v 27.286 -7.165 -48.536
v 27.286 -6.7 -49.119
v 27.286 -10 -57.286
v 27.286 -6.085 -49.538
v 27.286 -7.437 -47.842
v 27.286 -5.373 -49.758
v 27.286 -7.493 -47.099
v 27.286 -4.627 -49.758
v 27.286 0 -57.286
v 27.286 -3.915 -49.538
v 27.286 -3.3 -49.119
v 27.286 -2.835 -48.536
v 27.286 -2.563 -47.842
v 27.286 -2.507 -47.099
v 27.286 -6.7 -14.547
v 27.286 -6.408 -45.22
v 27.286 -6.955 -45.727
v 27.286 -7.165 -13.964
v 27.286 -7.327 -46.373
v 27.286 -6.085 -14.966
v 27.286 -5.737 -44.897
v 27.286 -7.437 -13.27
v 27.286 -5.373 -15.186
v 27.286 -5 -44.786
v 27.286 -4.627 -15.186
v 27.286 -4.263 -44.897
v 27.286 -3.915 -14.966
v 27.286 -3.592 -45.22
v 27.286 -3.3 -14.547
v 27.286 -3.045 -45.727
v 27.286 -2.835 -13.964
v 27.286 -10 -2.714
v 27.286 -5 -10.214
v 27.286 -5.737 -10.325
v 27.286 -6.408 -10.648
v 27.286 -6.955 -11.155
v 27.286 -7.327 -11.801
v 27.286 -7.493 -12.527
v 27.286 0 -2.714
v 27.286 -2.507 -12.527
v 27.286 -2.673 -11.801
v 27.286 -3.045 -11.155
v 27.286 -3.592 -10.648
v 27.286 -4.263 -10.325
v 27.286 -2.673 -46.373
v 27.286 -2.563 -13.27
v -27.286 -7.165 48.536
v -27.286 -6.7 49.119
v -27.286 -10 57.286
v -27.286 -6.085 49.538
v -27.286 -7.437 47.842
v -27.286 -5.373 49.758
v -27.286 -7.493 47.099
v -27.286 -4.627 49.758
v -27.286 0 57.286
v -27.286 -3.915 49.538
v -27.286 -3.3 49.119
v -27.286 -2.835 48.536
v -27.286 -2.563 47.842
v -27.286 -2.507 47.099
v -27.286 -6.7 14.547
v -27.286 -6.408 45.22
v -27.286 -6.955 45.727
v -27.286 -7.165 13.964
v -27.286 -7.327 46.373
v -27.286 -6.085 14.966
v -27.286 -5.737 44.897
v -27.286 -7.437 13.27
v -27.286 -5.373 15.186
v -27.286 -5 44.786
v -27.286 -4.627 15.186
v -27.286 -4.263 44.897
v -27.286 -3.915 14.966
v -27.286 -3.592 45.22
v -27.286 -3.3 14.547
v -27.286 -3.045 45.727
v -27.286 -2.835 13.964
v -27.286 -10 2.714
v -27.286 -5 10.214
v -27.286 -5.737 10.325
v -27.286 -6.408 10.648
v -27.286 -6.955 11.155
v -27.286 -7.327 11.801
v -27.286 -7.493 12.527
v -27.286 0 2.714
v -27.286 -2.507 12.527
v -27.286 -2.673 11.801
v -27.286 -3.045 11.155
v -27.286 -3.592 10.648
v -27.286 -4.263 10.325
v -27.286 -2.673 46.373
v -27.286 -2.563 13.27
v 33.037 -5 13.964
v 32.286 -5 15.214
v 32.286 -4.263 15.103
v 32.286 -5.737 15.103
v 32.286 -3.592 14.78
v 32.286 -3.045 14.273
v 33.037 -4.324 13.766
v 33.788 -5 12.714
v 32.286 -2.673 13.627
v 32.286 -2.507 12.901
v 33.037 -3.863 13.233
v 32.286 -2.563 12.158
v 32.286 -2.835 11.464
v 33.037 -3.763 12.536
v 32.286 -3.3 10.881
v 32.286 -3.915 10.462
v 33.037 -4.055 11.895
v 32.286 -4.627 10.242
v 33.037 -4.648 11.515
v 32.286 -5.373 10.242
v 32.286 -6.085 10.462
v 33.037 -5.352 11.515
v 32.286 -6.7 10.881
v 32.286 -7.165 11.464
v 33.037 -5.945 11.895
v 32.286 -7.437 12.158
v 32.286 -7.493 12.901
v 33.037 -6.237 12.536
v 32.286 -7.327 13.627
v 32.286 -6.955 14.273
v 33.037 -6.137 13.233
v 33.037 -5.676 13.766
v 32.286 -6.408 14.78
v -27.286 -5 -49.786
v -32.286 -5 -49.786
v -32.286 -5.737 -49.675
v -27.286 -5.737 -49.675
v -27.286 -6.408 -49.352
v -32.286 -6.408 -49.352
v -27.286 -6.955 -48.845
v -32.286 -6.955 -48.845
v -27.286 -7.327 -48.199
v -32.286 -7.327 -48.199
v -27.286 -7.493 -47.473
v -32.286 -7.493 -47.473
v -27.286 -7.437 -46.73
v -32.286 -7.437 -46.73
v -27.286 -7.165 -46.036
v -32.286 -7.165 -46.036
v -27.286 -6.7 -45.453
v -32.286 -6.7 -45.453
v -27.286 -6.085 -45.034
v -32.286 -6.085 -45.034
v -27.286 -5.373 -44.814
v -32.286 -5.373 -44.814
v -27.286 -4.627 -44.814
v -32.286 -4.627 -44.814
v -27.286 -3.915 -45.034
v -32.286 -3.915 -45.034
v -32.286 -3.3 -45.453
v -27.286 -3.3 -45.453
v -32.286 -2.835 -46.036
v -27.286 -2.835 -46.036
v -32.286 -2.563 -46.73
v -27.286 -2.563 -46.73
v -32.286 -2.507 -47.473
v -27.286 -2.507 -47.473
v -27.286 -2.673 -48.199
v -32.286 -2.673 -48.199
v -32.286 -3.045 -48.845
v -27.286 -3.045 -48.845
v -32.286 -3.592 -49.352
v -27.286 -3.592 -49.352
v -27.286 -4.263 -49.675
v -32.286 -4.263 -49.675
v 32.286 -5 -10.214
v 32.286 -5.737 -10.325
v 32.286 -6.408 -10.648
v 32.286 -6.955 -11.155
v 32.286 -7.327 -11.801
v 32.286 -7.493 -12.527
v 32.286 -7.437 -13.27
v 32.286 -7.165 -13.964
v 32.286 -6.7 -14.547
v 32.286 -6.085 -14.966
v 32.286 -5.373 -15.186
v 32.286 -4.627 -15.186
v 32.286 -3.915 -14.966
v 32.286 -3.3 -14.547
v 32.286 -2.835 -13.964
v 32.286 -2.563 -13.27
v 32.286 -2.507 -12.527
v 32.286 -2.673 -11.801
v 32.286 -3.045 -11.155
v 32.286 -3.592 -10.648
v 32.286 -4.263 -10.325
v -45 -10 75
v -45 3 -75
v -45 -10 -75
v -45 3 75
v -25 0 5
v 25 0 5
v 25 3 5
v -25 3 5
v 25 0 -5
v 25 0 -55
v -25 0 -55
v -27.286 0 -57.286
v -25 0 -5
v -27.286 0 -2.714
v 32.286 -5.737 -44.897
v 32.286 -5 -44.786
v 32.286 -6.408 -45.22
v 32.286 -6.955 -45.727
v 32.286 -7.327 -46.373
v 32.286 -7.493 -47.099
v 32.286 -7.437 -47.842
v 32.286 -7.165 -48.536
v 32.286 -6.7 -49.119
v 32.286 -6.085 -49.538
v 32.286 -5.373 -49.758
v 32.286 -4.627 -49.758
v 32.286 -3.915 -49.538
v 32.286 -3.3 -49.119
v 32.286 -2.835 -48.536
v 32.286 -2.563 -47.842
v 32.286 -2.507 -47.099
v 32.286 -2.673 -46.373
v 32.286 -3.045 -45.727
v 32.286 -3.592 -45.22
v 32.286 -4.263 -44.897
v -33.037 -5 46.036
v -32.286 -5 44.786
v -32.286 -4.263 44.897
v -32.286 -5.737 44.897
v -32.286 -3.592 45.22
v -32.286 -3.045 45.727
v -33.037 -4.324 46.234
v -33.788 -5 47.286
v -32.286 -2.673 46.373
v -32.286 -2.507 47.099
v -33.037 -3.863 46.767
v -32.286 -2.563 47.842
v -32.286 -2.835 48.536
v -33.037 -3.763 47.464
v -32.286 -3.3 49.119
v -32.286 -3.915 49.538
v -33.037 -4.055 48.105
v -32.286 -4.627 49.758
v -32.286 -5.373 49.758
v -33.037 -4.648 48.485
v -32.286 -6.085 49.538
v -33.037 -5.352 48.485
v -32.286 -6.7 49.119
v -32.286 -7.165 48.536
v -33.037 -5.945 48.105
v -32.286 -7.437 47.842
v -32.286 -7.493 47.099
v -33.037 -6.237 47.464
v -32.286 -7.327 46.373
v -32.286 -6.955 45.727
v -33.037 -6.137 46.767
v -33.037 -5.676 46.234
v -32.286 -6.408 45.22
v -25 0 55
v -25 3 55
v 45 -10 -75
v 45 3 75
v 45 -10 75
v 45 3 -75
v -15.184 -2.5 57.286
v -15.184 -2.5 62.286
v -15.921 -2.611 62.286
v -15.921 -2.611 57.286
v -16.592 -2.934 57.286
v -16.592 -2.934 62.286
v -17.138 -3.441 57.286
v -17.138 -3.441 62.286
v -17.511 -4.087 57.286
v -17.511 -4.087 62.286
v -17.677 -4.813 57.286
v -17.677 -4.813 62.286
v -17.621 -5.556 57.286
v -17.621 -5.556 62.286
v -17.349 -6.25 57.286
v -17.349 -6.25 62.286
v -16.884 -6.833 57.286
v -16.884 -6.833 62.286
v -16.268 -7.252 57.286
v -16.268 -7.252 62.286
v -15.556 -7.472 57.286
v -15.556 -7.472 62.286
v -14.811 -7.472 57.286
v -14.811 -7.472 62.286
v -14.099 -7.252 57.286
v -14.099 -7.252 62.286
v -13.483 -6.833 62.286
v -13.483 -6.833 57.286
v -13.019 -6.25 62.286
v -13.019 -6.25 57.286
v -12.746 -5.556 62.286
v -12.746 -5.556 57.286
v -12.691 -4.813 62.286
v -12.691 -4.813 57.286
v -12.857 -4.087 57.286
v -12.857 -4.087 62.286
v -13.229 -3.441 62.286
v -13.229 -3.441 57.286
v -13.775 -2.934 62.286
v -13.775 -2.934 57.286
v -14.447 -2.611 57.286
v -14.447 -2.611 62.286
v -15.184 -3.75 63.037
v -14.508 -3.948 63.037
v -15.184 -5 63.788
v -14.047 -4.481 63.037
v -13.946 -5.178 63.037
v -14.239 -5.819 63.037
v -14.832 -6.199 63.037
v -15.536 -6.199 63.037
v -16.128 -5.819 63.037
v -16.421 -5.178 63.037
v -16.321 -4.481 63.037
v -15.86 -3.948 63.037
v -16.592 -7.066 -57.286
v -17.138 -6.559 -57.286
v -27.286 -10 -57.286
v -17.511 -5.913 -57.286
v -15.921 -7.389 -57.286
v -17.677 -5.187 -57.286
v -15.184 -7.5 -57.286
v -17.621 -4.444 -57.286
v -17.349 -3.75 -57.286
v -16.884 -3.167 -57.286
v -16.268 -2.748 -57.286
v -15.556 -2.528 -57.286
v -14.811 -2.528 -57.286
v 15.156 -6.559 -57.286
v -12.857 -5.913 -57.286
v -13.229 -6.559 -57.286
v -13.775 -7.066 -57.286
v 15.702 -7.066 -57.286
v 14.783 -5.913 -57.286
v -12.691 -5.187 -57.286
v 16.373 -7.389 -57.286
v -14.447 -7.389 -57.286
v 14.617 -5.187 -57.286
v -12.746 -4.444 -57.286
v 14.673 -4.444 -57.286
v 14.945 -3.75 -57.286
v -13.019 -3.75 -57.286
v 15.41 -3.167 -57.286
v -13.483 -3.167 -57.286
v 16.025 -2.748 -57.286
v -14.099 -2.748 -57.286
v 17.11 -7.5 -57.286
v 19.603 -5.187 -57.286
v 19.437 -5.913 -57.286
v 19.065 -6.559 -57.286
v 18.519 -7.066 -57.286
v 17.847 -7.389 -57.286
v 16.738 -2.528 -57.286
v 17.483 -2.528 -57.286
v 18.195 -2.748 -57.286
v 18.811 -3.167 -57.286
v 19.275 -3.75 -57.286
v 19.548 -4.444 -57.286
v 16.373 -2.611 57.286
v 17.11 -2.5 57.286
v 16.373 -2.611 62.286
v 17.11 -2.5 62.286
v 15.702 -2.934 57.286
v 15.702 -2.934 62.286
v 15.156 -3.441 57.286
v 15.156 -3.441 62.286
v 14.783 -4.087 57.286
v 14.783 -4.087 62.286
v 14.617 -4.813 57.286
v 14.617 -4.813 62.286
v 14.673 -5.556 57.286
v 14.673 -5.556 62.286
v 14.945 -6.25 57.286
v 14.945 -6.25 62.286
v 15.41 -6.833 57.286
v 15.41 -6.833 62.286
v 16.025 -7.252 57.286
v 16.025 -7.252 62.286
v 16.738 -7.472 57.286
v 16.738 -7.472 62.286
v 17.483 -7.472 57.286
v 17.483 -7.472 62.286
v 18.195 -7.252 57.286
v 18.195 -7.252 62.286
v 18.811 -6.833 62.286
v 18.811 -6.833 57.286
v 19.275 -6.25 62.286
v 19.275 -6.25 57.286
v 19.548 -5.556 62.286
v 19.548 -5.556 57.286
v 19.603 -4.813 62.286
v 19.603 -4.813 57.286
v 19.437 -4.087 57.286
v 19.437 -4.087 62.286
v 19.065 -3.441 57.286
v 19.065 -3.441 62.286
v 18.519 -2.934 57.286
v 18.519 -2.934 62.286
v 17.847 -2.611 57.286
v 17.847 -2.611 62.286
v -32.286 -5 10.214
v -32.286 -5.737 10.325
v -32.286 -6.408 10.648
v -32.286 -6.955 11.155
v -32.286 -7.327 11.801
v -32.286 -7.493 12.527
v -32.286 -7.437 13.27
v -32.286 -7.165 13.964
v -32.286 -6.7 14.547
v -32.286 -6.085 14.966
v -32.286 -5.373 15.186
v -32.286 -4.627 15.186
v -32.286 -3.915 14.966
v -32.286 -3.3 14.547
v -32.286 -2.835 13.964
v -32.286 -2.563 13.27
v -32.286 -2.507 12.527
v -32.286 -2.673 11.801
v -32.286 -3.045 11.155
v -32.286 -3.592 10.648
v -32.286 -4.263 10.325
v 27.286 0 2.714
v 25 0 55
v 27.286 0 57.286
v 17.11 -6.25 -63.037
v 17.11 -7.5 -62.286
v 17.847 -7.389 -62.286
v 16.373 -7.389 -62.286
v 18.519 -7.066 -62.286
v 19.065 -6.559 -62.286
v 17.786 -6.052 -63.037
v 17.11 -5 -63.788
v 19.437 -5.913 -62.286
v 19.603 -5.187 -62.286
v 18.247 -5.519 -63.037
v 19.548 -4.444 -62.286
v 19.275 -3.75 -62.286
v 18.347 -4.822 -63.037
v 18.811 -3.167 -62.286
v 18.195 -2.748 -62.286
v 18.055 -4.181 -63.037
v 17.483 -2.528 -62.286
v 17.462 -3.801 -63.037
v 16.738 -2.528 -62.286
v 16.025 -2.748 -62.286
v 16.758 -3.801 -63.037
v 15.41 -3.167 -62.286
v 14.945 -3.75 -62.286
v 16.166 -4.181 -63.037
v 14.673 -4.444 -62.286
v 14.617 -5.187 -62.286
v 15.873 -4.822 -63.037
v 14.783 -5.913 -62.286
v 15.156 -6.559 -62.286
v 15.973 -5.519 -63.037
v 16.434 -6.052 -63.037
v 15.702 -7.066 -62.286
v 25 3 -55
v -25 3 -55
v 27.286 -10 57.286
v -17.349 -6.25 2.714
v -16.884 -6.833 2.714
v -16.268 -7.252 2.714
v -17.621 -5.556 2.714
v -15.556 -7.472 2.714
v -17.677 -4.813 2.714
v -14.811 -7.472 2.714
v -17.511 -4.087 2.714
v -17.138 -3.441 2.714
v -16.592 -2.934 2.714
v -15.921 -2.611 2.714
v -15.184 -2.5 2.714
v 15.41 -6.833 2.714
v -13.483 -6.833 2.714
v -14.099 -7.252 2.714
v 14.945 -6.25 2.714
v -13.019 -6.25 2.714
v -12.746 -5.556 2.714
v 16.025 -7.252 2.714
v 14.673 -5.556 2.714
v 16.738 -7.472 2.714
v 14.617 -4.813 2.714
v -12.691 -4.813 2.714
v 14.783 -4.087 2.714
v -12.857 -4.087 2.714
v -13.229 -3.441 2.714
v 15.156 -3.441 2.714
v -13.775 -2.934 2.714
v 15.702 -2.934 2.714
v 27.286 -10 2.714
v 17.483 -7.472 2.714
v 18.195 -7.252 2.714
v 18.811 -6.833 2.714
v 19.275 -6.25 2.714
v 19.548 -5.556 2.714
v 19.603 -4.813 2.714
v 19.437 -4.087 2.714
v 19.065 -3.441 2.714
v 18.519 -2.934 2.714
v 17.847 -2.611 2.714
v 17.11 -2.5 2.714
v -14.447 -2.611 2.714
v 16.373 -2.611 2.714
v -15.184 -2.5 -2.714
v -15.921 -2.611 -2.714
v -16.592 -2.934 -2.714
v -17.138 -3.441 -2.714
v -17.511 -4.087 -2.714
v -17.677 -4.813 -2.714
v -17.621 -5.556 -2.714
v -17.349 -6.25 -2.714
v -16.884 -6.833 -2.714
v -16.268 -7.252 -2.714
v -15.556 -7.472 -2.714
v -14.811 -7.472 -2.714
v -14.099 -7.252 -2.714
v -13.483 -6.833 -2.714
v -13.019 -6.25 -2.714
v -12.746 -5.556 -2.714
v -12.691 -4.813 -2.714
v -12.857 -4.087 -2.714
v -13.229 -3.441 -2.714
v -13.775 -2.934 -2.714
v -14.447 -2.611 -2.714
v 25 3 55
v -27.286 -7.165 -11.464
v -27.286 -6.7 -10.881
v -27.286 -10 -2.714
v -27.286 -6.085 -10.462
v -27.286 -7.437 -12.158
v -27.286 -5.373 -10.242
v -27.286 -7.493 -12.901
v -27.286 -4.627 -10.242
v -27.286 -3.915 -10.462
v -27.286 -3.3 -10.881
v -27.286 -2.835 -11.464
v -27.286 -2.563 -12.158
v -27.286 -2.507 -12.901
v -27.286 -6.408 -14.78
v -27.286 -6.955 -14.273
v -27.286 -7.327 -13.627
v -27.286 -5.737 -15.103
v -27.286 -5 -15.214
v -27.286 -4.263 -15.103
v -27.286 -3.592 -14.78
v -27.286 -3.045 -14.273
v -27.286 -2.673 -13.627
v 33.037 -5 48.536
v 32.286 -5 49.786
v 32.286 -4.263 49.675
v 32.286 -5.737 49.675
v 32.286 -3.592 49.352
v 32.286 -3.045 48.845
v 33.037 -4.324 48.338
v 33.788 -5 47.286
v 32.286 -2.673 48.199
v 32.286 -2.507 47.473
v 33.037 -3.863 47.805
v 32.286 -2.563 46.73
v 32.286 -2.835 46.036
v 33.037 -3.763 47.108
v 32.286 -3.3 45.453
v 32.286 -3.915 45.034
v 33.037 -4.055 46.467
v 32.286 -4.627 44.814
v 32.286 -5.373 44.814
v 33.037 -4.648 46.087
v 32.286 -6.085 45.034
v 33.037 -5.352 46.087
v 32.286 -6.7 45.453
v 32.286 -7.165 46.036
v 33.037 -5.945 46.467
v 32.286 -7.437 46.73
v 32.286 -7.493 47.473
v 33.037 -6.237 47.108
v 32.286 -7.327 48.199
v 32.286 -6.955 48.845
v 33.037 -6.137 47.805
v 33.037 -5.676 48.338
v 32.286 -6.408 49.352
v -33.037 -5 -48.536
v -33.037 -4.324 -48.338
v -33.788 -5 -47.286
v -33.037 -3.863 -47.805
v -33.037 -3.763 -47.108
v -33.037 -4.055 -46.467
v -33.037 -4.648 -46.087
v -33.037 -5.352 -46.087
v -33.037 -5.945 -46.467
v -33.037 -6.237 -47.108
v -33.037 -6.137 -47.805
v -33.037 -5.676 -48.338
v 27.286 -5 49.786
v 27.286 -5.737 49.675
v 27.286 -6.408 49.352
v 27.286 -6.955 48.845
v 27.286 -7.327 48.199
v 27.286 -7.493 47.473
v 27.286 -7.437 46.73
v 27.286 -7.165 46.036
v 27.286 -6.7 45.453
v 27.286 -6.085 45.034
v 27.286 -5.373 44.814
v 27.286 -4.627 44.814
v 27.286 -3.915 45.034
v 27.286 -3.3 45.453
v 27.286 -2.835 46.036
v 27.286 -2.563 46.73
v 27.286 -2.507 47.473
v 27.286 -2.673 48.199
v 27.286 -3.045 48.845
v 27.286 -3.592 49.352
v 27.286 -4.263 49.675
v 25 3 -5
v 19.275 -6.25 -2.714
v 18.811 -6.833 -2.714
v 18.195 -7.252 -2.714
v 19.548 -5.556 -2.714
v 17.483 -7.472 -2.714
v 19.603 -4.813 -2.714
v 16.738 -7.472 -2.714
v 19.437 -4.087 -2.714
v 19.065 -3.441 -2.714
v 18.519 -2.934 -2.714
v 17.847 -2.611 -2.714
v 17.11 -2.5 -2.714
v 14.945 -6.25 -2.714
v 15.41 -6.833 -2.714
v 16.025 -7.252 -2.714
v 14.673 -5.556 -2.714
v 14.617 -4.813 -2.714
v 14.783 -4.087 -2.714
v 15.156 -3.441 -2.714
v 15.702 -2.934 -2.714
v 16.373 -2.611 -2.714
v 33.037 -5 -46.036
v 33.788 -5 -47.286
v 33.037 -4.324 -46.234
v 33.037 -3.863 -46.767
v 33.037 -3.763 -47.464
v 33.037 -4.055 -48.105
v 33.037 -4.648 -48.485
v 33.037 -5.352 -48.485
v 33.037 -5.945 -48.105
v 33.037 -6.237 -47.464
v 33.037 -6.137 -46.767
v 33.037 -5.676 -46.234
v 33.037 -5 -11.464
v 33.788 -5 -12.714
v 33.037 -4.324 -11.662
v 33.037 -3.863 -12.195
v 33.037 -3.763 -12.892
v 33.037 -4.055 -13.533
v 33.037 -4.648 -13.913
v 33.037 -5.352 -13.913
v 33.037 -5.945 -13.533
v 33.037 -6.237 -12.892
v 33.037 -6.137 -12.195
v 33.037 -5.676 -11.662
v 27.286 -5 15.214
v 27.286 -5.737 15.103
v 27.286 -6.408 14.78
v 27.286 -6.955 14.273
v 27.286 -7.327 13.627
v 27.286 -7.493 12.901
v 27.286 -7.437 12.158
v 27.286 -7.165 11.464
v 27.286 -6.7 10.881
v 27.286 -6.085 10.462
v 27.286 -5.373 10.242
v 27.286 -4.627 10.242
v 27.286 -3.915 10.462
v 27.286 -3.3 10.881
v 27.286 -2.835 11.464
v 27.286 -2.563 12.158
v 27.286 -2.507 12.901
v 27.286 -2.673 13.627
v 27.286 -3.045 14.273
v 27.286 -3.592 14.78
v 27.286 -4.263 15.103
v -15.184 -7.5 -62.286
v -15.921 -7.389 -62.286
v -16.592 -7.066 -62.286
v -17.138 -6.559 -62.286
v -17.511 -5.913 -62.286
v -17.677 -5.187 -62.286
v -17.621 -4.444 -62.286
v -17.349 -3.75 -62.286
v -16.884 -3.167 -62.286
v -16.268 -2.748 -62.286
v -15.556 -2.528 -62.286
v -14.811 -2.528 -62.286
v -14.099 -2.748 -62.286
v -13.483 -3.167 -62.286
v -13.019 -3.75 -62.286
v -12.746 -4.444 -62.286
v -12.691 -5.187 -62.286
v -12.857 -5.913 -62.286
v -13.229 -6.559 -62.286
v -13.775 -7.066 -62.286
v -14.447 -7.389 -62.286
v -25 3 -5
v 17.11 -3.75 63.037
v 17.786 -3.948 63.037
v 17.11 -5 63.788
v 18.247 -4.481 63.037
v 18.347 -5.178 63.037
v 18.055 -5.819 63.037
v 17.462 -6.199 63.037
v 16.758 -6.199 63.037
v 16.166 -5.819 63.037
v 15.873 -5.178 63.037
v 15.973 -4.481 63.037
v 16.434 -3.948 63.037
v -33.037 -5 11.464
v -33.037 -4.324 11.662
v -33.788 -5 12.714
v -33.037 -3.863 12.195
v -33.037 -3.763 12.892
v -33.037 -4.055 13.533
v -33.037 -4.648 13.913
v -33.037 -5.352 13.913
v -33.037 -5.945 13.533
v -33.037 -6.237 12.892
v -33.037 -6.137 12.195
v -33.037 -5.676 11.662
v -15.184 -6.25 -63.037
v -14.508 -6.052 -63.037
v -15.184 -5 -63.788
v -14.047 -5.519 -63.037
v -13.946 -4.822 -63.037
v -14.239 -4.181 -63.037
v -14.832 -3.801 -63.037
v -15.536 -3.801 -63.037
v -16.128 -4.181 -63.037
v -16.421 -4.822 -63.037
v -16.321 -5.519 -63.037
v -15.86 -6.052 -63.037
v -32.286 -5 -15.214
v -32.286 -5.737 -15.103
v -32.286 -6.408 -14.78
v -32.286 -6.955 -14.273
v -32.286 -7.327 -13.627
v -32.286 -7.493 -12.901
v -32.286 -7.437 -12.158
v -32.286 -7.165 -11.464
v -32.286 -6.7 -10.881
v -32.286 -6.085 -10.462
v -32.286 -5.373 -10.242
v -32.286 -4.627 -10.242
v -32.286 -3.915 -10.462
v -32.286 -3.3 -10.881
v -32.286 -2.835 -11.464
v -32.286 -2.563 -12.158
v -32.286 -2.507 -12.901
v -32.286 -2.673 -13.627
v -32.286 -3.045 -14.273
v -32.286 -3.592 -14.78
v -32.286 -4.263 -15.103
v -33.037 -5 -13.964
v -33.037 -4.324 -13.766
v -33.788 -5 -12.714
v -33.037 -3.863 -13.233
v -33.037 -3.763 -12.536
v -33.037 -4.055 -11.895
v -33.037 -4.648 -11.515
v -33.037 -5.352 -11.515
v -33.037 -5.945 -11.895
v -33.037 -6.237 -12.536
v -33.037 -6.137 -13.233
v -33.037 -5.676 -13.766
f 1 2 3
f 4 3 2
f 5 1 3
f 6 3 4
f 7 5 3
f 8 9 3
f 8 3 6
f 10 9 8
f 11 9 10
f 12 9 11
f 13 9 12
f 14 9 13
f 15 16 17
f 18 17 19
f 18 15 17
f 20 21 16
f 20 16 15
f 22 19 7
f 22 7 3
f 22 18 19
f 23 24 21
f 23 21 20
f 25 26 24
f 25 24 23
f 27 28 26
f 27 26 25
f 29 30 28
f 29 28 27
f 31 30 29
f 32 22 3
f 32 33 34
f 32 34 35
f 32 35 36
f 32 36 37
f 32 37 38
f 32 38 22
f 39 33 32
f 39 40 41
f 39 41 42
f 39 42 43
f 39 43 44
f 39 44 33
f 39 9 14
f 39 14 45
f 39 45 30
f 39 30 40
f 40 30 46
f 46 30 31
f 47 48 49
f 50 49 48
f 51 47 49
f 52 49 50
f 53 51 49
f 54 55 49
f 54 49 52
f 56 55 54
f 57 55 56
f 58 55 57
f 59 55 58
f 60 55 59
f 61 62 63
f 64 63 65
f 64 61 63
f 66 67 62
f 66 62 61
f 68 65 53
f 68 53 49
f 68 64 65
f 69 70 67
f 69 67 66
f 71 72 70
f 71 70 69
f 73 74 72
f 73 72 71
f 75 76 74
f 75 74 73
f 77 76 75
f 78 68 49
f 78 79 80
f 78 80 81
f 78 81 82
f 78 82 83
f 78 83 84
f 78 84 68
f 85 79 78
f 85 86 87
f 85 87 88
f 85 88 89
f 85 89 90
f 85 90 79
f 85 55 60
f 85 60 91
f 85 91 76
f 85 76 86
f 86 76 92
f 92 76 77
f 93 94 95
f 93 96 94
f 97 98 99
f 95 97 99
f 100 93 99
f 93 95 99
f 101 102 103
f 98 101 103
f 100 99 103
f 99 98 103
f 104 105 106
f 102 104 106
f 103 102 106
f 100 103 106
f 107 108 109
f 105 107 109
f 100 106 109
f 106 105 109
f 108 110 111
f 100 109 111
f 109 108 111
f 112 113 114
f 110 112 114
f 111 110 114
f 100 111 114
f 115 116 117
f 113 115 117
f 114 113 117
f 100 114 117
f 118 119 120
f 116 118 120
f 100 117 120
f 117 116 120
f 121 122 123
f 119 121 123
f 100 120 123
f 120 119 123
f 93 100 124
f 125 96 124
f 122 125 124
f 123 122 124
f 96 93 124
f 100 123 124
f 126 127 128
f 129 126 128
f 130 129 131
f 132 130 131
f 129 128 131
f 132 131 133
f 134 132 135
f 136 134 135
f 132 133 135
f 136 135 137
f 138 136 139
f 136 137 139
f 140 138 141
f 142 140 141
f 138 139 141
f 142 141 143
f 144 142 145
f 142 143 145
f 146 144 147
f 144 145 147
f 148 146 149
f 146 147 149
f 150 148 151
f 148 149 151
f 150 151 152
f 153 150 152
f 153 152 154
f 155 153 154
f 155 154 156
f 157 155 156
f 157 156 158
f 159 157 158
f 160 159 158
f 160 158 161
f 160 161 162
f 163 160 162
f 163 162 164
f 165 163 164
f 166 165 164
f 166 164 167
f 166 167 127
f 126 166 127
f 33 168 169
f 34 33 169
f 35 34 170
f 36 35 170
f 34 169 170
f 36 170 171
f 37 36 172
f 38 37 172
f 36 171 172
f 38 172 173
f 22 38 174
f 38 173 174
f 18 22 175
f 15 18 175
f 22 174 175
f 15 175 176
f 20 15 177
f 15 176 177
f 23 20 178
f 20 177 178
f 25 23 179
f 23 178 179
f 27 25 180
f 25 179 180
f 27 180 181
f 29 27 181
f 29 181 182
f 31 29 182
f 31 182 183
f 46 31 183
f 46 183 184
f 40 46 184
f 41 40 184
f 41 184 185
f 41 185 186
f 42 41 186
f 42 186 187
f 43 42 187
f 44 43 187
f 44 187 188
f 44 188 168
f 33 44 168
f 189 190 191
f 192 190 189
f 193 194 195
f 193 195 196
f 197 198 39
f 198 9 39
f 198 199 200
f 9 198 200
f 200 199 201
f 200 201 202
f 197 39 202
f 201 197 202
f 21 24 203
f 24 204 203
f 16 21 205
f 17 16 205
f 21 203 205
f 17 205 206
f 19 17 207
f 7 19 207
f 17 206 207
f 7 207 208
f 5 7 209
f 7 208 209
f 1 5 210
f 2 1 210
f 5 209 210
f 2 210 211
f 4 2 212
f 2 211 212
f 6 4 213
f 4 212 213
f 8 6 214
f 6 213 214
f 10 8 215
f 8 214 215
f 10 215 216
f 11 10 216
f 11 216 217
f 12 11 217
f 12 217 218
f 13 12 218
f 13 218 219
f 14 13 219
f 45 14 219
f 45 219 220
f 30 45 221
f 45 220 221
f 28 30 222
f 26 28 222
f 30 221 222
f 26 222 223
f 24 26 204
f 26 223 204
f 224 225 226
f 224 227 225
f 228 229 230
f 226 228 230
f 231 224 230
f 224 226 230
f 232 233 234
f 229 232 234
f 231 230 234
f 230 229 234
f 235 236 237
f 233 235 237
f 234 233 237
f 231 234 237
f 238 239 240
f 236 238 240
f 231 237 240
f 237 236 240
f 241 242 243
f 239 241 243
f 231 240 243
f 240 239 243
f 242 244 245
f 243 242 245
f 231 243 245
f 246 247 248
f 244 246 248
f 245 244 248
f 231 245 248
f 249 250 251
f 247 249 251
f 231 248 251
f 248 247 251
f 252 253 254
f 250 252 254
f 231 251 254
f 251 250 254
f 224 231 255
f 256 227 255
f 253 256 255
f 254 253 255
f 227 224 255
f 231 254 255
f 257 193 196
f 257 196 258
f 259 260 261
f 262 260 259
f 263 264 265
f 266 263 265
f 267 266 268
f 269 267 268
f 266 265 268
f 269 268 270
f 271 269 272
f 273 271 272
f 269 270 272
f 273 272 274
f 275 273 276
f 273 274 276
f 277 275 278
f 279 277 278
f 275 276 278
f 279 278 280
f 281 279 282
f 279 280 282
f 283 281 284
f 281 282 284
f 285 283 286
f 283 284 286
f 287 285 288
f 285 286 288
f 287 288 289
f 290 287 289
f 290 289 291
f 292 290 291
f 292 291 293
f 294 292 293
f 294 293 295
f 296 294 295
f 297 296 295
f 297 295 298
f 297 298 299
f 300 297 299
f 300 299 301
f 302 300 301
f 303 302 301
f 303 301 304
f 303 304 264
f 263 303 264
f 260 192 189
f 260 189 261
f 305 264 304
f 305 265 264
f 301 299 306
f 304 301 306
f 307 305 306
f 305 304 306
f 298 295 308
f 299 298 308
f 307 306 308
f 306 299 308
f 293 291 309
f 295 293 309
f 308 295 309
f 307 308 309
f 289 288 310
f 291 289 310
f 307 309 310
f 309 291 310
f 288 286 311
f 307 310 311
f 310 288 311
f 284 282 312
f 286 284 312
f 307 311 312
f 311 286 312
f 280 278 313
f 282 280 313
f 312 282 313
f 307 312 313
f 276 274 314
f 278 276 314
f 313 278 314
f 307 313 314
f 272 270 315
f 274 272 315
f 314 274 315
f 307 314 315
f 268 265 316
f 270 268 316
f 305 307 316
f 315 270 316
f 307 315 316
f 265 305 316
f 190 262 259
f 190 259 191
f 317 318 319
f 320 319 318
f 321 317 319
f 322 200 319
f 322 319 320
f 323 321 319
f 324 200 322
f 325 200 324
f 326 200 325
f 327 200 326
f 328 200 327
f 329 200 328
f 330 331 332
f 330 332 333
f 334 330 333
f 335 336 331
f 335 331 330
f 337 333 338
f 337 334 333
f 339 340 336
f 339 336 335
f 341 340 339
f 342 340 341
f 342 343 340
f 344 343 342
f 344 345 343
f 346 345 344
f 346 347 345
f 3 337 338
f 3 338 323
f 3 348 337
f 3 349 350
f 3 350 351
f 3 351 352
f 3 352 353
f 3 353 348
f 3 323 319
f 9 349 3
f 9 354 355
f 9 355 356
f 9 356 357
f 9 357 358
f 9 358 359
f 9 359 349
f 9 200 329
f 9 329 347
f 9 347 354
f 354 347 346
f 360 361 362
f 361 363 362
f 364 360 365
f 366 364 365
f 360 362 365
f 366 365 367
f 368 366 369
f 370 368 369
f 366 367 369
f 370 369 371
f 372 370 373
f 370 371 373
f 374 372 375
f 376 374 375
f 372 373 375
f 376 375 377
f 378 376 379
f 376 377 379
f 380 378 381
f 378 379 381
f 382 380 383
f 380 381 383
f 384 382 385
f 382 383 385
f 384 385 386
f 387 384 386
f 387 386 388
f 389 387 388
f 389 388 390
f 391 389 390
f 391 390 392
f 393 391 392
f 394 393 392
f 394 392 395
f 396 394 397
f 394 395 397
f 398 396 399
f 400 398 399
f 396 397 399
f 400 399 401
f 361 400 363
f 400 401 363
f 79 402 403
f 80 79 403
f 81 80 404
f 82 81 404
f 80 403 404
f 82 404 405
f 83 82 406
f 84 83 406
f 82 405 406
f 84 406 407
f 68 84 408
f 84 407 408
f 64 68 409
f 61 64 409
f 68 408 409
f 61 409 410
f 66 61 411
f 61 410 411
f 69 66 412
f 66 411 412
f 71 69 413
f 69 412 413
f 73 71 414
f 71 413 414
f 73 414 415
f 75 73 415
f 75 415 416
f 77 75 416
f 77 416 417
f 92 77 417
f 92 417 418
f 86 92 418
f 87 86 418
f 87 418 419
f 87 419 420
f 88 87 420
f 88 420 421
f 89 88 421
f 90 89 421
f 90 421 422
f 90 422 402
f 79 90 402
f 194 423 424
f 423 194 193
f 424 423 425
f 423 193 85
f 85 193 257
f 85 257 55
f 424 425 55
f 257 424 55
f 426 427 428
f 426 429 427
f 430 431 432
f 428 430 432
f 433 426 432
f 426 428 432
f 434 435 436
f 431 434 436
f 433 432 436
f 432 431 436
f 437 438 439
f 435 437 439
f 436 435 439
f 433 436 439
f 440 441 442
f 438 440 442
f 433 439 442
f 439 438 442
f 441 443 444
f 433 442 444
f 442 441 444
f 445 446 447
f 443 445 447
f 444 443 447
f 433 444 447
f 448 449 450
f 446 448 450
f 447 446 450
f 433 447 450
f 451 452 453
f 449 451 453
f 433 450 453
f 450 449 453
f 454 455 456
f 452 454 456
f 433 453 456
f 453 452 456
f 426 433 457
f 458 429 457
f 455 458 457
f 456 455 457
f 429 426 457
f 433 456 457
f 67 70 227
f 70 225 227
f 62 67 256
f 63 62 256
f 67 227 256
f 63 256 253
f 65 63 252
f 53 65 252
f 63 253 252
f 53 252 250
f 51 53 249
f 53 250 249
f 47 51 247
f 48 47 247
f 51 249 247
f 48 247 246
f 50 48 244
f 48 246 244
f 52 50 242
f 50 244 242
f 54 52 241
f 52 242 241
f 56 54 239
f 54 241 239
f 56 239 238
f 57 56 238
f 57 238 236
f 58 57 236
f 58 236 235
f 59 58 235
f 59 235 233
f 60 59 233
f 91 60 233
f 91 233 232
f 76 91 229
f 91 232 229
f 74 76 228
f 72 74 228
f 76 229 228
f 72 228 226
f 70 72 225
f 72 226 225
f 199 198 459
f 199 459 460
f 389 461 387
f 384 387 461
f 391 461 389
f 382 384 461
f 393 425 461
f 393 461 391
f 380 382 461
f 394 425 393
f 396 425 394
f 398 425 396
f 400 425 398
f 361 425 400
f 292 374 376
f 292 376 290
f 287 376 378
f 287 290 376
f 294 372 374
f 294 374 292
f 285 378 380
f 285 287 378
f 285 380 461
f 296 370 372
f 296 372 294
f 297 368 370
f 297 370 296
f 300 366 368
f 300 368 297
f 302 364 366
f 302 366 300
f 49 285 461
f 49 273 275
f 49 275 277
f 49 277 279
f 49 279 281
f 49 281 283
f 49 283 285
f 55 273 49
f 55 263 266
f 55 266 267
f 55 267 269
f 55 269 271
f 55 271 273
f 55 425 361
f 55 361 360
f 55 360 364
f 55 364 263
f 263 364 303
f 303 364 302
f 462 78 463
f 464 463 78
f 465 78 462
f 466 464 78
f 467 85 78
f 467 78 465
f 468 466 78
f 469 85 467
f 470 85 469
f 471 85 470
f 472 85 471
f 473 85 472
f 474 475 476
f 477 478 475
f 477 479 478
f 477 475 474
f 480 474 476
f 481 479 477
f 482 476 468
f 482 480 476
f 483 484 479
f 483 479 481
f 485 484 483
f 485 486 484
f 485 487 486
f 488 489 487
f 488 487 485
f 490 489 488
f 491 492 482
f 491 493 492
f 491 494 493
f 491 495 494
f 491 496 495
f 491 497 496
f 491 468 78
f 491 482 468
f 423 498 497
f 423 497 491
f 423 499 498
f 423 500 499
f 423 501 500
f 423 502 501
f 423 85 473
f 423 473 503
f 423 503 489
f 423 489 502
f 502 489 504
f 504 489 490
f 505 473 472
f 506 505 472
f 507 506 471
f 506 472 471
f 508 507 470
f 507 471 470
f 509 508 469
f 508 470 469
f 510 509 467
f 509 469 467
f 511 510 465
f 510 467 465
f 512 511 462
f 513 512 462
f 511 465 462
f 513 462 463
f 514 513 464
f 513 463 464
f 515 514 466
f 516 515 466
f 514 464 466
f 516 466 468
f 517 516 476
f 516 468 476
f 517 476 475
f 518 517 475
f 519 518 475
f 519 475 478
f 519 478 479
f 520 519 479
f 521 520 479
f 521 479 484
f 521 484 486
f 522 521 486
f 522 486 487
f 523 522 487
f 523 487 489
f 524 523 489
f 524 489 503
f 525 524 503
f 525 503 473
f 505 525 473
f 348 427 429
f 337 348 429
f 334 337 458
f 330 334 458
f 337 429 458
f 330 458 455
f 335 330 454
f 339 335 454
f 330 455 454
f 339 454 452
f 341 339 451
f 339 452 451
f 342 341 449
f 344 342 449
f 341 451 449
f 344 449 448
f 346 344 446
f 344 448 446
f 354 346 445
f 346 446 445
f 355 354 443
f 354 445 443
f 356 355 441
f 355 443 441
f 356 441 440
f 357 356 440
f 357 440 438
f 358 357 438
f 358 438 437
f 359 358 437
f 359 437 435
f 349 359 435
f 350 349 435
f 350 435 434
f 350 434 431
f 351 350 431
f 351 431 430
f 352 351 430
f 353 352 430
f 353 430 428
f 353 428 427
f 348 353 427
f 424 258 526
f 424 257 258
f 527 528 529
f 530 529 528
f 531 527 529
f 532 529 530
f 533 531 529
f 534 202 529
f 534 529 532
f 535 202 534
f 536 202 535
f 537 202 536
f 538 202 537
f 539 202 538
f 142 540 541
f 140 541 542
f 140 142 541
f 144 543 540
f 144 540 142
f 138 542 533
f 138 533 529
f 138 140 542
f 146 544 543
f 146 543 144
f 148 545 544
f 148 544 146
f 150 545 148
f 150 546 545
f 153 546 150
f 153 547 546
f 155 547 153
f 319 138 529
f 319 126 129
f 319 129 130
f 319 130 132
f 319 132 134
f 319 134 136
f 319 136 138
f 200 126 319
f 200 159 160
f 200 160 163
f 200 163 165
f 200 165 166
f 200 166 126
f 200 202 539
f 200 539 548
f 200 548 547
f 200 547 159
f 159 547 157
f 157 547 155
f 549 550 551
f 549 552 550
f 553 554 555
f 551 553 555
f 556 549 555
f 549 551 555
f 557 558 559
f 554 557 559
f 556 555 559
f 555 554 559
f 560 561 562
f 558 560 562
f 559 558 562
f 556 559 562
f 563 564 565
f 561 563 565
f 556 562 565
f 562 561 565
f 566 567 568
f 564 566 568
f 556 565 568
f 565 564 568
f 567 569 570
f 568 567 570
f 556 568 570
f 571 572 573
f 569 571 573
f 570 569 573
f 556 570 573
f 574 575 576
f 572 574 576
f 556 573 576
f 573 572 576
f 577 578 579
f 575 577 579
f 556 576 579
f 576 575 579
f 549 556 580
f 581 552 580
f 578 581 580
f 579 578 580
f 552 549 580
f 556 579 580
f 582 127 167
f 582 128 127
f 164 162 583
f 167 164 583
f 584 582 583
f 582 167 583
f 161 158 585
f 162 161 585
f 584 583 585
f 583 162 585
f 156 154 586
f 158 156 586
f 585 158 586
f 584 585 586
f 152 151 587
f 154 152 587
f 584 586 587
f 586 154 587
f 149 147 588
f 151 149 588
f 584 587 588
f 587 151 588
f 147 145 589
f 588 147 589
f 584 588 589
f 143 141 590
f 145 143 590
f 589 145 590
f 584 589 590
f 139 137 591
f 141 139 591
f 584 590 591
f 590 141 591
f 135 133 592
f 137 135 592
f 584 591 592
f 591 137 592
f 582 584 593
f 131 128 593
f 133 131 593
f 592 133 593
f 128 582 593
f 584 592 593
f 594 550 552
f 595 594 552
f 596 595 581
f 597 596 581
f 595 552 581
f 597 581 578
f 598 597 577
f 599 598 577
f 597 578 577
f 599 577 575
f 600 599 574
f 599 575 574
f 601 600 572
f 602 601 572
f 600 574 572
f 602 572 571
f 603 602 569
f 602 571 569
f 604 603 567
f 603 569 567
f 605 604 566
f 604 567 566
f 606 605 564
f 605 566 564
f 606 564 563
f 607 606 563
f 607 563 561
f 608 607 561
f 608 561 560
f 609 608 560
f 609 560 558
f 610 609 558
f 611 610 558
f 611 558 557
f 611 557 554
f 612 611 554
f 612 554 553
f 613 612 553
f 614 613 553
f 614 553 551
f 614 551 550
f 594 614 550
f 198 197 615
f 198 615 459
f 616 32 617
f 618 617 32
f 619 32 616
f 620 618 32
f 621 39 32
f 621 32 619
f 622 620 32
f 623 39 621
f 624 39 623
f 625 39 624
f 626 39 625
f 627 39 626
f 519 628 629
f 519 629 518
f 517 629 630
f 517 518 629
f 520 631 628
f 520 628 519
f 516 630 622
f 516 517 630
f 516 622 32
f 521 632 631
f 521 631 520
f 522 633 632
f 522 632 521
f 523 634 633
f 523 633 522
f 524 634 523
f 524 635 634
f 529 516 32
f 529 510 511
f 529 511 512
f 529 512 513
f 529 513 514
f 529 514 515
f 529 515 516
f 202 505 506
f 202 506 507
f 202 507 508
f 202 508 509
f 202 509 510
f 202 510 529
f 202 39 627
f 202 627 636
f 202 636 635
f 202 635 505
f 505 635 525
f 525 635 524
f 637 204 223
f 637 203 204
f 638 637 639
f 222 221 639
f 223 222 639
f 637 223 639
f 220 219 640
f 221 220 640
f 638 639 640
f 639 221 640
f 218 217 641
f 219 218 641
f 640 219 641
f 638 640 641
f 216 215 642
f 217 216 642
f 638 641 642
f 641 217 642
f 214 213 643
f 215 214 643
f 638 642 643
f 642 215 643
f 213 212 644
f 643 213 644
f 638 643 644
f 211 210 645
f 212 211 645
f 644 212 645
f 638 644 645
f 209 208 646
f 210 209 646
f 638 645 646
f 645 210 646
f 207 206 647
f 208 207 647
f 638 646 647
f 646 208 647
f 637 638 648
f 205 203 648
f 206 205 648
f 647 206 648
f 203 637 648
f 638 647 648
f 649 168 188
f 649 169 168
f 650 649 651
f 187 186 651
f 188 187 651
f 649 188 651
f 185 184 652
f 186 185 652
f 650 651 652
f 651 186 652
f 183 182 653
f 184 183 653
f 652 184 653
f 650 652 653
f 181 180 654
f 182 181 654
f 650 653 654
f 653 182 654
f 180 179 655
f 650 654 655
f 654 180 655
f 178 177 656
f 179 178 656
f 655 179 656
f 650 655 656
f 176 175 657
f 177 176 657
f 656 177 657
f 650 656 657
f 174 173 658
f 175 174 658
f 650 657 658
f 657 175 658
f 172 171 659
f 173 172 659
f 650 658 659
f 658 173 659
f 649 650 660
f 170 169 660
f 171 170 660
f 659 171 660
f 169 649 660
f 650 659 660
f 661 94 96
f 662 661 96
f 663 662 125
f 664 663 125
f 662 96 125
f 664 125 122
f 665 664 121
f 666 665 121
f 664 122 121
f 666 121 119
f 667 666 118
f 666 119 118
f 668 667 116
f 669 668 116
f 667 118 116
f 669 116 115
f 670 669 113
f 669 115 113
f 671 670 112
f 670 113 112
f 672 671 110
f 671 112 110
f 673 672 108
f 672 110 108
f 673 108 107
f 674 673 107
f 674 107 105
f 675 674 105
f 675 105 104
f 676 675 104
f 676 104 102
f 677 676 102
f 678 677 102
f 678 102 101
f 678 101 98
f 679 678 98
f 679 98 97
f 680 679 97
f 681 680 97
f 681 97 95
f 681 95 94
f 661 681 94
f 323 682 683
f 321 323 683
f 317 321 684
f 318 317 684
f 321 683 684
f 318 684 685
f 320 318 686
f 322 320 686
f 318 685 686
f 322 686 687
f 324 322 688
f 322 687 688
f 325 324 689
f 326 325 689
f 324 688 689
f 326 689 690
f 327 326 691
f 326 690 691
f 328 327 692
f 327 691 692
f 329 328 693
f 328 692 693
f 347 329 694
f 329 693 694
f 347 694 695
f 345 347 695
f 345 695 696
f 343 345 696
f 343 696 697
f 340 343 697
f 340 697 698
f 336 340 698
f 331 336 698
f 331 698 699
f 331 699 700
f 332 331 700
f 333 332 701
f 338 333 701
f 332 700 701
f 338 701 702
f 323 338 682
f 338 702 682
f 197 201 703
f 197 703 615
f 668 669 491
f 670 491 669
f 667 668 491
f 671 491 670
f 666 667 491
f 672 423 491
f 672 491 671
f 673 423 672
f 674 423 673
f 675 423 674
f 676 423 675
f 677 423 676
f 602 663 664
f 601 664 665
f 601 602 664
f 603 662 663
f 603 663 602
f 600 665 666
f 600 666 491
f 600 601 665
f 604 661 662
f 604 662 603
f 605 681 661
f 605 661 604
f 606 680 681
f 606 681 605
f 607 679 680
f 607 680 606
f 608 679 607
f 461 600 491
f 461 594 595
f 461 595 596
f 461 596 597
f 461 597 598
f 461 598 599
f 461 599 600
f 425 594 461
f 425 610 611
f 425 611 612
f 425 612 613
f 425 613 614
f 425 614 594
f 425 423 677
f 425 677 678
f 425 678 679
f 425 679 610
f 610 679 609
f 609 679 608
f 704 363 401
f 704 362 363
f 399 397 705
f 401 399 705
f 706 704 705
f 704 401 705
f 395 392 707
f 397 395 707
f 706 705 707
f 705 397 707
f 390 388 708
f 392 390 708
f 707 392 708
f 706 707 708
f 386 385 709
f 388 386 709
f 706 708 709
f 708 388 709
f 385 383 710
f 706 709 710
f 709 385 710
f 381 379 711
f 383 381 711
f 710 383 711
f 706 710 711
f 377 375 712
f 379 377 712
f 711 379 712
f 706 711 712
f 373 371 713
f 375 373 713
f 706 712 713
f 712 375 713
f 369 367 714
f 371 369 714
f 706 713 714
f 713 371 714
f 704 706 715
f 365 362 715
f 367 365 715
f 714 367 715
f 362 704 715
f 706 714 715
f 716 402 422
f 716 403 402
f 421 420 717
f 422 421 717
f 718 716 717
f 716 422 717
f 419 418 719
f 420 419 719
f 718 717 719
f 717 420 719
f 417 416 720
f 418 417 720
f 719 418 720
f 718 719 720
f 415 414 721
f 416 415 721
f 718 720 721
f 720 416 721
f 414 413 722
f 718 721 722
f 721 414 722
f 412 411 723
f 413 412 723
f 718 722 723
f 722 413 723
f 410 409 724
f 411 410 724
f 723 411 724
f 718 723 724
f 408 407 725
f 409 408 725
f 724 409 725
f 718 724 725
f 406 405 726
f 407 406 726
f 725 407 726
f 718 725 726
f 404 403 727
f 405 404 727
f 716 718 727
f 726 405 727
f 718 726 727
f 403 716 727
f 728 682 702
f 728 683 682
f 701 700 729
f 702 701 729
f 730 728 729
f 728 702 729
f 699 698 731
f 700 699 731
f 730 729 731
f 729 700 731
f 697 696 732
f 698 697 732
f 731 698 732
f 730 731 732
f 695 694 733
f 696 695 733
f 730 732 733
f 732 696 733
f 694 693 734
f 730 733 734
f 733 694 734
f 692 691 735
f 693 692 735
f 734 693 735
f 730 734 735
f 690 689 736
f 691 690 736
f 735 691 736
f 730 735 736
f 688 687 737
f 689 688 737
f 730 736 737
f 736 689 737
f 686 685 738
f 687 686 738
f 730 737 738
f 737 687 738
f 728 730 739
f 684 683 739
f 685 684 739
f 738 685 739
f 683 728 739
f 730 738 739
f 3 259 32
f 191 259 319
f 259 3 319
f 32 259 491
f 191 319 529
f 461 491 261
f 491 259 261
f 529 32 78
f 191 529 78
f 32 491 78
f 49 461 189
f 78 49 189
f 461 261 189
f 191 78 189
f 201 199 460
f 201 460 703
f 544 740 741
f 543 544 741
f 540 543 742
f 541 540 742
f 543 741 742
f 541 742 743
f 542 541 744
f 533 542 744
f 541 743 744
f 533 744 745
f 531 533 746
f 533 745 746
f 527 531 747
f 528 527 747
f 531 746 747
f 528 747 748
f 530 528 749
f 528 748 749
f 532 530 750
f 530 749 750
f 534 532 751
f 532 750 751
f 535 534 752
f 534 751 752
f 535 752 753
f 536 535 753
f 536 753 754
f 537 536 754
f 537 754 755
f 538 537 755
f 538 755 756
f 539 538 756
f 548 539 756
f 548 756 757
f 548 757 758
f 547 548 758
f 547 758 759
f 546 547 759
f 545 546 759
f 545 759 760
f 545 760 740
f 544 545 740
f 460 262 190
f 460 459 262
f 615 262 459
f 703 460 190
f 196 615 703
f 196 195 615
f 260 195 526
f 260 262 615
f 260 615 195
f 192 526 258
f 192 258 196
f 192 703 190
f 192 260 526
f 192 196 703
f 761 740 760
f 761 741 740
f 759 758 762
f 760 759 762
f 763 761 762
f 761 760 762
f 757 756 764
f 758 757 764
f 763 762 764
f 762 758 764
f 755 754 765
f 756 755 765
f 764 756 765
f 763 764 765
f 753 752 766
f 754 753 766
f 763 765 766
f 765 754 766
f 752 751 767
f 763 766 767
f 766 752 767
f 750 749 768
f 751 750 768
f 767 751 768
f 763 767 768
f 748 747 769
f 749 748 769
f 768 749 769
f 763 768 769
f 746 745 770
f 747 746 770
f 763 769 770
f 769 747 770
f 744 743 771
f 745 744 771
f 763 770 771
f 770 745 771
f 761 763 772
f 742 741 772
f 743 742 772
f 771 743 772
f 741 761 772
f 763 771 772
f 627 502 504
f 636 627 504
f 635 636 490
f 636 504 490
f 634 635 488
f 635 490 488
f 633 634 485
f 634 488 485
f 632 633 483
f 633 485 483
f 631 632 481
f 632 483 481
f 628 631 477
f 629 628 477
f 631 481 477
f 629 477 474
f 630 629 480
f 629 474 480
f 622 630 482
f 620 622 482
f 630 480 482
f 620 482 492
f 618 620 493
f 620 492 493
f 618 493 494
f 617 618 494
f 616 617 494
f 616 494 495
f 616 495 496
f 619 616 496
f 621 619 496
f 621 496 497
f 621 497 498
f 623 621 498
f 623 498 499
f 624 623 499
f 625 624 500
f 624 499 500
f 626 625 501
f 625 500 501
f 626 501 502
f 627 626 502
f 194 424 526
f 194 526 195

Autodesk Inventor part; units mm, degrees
ref_plane "YZ Plane" through (0, 0, 0) normal (1, 0, 0) x (0, 1, 0)
ref_plane "XZ Plane" through (0, 0, 0) normal (0, 1, 0) x (-1, 0, 0)
ref_plane "XY Plane" through (0, 0, 0) normal (0, 0, 1) x (1, 0, 0)
sketch "Sketch8" plane through (0, 0, 0) normal (0, 1, 0) x (-1, 0, 0)
  line L0 (45, -75) -> (45, 75) projected
  line L1 (45, 75) -> (-45, 75) projected
  line L2 (-45, 75) -> (-45, -75) projected
  line L3 (-45, -75) -> (45, -75) projected
  line L4 (-27.286, -57.286) -> (-27.286, -2.714) projected
  line L5 (27.286, -57.286) -> (-27.286, -57.286) projected
  line L6 (27.286, -2.714) -> (27.286, -57.286) projected
  line L7 (-27.286, -2.714) -> (27.286, -2.714) projected
  line L8 (27.286, 57.286) -> (27.286, 2.714) projected
  line L9 (27.286, 2.714) -> (-27.286, 2.714) projected
  line L10 (-27.286, 57.286) -> (27.286, 57.286) projected
  line L11 (-27.286, 2.714) -> (-27.286, 57.286) projected
  point P0 (0, 0)
extrude "Extrusion7" add sketch "Sketch8" against normal blind 10
sketch "Sketch2" plane through (0, 0, 0) normal (0, 1, 0) x (-1, 0, 0)
  line L0 (45, 75) -> (-45, 75)
  line L1 (-45, -75) -> (45, -75)
  line L2 (45, -75) -> (45, 75)
  line L3 (-45, 75) -> (-45, -75)
  line L4 (-25, -55) -> (25, -55)
  line L5 (25, -55) -> (25, -5)
  line L6 (25, -5) -> (-25, -5)
  line L7 (-25, -5) -> (-25, -55)
  line L8 (-25, 5) -> (25, 5)
  line L9 (25, 5) -> (25, 55)
  line L10 (25, 55) -> (-25, 55)
  line L11 (-25, 55) -> (-25, 5)
  line L12 (-27.286, 57.286) -> (27.286, 57.286)
  line L13 (27.286, 57.286) -> (27.286, 2.714)
  line L14 (27.286, 2.714) -> (-27.286, 2.714)
  line L15 (-27.286, 2.714) -> (-27.286, 57.286)
  line L16 (-27.286, -2.714) -> (27.286, -2.714)
  line L17 (27.286, -2.714) -> (27.286, -57.286)
  line L18 (27.286, -57.286) -> (-27.286, -57.286)
  line L19 (-27.286, -57.286) -> (-27.286, -2.714)
  point P0 (0, 0)
extrude "Extrusion8" add sketch "Sketch2" along normal blind 3 contours L2 L1 L3 L0 | L12 L13 L14 L15 | L16 L17 L18 L19
hole "Hole1" at (27.286, -5, 12.714) at (27.286, -5, 47.286) at (27.286, -5, -12.714) at (27.286, -5, -47.286) direction (1, 0, 0) diameter 5 depth 5 tip angle 118
hole "Hole2" at (-15.1837, -5, -57.286) at (17.1102, -5, -57.286) direction (0, 0, -1) diameter 5 depth 5 tip angle 118
hole "Hole3" at (-27.286, -5, 47.286) at (-27.286, -5, 12.714) at (-27.286, -5, -12.714) at (-27.286, -5, -47.286) direction (-1, 0, 0) diameter 5 depth 5 tip angle 118
hole "Hole5" at (17.1102, -5, 57.286) at (-15.1837, -5, 57.286) direction (0, 0, 1) diameter 5 depth 5 tip angle 118
hole "Hole6" at (-15.1837, -5, -2.714) at (17.1102, -5, -2.714) direction (0, 0, 1) diameter 5 end up to surface
properties part number "top_plate"
